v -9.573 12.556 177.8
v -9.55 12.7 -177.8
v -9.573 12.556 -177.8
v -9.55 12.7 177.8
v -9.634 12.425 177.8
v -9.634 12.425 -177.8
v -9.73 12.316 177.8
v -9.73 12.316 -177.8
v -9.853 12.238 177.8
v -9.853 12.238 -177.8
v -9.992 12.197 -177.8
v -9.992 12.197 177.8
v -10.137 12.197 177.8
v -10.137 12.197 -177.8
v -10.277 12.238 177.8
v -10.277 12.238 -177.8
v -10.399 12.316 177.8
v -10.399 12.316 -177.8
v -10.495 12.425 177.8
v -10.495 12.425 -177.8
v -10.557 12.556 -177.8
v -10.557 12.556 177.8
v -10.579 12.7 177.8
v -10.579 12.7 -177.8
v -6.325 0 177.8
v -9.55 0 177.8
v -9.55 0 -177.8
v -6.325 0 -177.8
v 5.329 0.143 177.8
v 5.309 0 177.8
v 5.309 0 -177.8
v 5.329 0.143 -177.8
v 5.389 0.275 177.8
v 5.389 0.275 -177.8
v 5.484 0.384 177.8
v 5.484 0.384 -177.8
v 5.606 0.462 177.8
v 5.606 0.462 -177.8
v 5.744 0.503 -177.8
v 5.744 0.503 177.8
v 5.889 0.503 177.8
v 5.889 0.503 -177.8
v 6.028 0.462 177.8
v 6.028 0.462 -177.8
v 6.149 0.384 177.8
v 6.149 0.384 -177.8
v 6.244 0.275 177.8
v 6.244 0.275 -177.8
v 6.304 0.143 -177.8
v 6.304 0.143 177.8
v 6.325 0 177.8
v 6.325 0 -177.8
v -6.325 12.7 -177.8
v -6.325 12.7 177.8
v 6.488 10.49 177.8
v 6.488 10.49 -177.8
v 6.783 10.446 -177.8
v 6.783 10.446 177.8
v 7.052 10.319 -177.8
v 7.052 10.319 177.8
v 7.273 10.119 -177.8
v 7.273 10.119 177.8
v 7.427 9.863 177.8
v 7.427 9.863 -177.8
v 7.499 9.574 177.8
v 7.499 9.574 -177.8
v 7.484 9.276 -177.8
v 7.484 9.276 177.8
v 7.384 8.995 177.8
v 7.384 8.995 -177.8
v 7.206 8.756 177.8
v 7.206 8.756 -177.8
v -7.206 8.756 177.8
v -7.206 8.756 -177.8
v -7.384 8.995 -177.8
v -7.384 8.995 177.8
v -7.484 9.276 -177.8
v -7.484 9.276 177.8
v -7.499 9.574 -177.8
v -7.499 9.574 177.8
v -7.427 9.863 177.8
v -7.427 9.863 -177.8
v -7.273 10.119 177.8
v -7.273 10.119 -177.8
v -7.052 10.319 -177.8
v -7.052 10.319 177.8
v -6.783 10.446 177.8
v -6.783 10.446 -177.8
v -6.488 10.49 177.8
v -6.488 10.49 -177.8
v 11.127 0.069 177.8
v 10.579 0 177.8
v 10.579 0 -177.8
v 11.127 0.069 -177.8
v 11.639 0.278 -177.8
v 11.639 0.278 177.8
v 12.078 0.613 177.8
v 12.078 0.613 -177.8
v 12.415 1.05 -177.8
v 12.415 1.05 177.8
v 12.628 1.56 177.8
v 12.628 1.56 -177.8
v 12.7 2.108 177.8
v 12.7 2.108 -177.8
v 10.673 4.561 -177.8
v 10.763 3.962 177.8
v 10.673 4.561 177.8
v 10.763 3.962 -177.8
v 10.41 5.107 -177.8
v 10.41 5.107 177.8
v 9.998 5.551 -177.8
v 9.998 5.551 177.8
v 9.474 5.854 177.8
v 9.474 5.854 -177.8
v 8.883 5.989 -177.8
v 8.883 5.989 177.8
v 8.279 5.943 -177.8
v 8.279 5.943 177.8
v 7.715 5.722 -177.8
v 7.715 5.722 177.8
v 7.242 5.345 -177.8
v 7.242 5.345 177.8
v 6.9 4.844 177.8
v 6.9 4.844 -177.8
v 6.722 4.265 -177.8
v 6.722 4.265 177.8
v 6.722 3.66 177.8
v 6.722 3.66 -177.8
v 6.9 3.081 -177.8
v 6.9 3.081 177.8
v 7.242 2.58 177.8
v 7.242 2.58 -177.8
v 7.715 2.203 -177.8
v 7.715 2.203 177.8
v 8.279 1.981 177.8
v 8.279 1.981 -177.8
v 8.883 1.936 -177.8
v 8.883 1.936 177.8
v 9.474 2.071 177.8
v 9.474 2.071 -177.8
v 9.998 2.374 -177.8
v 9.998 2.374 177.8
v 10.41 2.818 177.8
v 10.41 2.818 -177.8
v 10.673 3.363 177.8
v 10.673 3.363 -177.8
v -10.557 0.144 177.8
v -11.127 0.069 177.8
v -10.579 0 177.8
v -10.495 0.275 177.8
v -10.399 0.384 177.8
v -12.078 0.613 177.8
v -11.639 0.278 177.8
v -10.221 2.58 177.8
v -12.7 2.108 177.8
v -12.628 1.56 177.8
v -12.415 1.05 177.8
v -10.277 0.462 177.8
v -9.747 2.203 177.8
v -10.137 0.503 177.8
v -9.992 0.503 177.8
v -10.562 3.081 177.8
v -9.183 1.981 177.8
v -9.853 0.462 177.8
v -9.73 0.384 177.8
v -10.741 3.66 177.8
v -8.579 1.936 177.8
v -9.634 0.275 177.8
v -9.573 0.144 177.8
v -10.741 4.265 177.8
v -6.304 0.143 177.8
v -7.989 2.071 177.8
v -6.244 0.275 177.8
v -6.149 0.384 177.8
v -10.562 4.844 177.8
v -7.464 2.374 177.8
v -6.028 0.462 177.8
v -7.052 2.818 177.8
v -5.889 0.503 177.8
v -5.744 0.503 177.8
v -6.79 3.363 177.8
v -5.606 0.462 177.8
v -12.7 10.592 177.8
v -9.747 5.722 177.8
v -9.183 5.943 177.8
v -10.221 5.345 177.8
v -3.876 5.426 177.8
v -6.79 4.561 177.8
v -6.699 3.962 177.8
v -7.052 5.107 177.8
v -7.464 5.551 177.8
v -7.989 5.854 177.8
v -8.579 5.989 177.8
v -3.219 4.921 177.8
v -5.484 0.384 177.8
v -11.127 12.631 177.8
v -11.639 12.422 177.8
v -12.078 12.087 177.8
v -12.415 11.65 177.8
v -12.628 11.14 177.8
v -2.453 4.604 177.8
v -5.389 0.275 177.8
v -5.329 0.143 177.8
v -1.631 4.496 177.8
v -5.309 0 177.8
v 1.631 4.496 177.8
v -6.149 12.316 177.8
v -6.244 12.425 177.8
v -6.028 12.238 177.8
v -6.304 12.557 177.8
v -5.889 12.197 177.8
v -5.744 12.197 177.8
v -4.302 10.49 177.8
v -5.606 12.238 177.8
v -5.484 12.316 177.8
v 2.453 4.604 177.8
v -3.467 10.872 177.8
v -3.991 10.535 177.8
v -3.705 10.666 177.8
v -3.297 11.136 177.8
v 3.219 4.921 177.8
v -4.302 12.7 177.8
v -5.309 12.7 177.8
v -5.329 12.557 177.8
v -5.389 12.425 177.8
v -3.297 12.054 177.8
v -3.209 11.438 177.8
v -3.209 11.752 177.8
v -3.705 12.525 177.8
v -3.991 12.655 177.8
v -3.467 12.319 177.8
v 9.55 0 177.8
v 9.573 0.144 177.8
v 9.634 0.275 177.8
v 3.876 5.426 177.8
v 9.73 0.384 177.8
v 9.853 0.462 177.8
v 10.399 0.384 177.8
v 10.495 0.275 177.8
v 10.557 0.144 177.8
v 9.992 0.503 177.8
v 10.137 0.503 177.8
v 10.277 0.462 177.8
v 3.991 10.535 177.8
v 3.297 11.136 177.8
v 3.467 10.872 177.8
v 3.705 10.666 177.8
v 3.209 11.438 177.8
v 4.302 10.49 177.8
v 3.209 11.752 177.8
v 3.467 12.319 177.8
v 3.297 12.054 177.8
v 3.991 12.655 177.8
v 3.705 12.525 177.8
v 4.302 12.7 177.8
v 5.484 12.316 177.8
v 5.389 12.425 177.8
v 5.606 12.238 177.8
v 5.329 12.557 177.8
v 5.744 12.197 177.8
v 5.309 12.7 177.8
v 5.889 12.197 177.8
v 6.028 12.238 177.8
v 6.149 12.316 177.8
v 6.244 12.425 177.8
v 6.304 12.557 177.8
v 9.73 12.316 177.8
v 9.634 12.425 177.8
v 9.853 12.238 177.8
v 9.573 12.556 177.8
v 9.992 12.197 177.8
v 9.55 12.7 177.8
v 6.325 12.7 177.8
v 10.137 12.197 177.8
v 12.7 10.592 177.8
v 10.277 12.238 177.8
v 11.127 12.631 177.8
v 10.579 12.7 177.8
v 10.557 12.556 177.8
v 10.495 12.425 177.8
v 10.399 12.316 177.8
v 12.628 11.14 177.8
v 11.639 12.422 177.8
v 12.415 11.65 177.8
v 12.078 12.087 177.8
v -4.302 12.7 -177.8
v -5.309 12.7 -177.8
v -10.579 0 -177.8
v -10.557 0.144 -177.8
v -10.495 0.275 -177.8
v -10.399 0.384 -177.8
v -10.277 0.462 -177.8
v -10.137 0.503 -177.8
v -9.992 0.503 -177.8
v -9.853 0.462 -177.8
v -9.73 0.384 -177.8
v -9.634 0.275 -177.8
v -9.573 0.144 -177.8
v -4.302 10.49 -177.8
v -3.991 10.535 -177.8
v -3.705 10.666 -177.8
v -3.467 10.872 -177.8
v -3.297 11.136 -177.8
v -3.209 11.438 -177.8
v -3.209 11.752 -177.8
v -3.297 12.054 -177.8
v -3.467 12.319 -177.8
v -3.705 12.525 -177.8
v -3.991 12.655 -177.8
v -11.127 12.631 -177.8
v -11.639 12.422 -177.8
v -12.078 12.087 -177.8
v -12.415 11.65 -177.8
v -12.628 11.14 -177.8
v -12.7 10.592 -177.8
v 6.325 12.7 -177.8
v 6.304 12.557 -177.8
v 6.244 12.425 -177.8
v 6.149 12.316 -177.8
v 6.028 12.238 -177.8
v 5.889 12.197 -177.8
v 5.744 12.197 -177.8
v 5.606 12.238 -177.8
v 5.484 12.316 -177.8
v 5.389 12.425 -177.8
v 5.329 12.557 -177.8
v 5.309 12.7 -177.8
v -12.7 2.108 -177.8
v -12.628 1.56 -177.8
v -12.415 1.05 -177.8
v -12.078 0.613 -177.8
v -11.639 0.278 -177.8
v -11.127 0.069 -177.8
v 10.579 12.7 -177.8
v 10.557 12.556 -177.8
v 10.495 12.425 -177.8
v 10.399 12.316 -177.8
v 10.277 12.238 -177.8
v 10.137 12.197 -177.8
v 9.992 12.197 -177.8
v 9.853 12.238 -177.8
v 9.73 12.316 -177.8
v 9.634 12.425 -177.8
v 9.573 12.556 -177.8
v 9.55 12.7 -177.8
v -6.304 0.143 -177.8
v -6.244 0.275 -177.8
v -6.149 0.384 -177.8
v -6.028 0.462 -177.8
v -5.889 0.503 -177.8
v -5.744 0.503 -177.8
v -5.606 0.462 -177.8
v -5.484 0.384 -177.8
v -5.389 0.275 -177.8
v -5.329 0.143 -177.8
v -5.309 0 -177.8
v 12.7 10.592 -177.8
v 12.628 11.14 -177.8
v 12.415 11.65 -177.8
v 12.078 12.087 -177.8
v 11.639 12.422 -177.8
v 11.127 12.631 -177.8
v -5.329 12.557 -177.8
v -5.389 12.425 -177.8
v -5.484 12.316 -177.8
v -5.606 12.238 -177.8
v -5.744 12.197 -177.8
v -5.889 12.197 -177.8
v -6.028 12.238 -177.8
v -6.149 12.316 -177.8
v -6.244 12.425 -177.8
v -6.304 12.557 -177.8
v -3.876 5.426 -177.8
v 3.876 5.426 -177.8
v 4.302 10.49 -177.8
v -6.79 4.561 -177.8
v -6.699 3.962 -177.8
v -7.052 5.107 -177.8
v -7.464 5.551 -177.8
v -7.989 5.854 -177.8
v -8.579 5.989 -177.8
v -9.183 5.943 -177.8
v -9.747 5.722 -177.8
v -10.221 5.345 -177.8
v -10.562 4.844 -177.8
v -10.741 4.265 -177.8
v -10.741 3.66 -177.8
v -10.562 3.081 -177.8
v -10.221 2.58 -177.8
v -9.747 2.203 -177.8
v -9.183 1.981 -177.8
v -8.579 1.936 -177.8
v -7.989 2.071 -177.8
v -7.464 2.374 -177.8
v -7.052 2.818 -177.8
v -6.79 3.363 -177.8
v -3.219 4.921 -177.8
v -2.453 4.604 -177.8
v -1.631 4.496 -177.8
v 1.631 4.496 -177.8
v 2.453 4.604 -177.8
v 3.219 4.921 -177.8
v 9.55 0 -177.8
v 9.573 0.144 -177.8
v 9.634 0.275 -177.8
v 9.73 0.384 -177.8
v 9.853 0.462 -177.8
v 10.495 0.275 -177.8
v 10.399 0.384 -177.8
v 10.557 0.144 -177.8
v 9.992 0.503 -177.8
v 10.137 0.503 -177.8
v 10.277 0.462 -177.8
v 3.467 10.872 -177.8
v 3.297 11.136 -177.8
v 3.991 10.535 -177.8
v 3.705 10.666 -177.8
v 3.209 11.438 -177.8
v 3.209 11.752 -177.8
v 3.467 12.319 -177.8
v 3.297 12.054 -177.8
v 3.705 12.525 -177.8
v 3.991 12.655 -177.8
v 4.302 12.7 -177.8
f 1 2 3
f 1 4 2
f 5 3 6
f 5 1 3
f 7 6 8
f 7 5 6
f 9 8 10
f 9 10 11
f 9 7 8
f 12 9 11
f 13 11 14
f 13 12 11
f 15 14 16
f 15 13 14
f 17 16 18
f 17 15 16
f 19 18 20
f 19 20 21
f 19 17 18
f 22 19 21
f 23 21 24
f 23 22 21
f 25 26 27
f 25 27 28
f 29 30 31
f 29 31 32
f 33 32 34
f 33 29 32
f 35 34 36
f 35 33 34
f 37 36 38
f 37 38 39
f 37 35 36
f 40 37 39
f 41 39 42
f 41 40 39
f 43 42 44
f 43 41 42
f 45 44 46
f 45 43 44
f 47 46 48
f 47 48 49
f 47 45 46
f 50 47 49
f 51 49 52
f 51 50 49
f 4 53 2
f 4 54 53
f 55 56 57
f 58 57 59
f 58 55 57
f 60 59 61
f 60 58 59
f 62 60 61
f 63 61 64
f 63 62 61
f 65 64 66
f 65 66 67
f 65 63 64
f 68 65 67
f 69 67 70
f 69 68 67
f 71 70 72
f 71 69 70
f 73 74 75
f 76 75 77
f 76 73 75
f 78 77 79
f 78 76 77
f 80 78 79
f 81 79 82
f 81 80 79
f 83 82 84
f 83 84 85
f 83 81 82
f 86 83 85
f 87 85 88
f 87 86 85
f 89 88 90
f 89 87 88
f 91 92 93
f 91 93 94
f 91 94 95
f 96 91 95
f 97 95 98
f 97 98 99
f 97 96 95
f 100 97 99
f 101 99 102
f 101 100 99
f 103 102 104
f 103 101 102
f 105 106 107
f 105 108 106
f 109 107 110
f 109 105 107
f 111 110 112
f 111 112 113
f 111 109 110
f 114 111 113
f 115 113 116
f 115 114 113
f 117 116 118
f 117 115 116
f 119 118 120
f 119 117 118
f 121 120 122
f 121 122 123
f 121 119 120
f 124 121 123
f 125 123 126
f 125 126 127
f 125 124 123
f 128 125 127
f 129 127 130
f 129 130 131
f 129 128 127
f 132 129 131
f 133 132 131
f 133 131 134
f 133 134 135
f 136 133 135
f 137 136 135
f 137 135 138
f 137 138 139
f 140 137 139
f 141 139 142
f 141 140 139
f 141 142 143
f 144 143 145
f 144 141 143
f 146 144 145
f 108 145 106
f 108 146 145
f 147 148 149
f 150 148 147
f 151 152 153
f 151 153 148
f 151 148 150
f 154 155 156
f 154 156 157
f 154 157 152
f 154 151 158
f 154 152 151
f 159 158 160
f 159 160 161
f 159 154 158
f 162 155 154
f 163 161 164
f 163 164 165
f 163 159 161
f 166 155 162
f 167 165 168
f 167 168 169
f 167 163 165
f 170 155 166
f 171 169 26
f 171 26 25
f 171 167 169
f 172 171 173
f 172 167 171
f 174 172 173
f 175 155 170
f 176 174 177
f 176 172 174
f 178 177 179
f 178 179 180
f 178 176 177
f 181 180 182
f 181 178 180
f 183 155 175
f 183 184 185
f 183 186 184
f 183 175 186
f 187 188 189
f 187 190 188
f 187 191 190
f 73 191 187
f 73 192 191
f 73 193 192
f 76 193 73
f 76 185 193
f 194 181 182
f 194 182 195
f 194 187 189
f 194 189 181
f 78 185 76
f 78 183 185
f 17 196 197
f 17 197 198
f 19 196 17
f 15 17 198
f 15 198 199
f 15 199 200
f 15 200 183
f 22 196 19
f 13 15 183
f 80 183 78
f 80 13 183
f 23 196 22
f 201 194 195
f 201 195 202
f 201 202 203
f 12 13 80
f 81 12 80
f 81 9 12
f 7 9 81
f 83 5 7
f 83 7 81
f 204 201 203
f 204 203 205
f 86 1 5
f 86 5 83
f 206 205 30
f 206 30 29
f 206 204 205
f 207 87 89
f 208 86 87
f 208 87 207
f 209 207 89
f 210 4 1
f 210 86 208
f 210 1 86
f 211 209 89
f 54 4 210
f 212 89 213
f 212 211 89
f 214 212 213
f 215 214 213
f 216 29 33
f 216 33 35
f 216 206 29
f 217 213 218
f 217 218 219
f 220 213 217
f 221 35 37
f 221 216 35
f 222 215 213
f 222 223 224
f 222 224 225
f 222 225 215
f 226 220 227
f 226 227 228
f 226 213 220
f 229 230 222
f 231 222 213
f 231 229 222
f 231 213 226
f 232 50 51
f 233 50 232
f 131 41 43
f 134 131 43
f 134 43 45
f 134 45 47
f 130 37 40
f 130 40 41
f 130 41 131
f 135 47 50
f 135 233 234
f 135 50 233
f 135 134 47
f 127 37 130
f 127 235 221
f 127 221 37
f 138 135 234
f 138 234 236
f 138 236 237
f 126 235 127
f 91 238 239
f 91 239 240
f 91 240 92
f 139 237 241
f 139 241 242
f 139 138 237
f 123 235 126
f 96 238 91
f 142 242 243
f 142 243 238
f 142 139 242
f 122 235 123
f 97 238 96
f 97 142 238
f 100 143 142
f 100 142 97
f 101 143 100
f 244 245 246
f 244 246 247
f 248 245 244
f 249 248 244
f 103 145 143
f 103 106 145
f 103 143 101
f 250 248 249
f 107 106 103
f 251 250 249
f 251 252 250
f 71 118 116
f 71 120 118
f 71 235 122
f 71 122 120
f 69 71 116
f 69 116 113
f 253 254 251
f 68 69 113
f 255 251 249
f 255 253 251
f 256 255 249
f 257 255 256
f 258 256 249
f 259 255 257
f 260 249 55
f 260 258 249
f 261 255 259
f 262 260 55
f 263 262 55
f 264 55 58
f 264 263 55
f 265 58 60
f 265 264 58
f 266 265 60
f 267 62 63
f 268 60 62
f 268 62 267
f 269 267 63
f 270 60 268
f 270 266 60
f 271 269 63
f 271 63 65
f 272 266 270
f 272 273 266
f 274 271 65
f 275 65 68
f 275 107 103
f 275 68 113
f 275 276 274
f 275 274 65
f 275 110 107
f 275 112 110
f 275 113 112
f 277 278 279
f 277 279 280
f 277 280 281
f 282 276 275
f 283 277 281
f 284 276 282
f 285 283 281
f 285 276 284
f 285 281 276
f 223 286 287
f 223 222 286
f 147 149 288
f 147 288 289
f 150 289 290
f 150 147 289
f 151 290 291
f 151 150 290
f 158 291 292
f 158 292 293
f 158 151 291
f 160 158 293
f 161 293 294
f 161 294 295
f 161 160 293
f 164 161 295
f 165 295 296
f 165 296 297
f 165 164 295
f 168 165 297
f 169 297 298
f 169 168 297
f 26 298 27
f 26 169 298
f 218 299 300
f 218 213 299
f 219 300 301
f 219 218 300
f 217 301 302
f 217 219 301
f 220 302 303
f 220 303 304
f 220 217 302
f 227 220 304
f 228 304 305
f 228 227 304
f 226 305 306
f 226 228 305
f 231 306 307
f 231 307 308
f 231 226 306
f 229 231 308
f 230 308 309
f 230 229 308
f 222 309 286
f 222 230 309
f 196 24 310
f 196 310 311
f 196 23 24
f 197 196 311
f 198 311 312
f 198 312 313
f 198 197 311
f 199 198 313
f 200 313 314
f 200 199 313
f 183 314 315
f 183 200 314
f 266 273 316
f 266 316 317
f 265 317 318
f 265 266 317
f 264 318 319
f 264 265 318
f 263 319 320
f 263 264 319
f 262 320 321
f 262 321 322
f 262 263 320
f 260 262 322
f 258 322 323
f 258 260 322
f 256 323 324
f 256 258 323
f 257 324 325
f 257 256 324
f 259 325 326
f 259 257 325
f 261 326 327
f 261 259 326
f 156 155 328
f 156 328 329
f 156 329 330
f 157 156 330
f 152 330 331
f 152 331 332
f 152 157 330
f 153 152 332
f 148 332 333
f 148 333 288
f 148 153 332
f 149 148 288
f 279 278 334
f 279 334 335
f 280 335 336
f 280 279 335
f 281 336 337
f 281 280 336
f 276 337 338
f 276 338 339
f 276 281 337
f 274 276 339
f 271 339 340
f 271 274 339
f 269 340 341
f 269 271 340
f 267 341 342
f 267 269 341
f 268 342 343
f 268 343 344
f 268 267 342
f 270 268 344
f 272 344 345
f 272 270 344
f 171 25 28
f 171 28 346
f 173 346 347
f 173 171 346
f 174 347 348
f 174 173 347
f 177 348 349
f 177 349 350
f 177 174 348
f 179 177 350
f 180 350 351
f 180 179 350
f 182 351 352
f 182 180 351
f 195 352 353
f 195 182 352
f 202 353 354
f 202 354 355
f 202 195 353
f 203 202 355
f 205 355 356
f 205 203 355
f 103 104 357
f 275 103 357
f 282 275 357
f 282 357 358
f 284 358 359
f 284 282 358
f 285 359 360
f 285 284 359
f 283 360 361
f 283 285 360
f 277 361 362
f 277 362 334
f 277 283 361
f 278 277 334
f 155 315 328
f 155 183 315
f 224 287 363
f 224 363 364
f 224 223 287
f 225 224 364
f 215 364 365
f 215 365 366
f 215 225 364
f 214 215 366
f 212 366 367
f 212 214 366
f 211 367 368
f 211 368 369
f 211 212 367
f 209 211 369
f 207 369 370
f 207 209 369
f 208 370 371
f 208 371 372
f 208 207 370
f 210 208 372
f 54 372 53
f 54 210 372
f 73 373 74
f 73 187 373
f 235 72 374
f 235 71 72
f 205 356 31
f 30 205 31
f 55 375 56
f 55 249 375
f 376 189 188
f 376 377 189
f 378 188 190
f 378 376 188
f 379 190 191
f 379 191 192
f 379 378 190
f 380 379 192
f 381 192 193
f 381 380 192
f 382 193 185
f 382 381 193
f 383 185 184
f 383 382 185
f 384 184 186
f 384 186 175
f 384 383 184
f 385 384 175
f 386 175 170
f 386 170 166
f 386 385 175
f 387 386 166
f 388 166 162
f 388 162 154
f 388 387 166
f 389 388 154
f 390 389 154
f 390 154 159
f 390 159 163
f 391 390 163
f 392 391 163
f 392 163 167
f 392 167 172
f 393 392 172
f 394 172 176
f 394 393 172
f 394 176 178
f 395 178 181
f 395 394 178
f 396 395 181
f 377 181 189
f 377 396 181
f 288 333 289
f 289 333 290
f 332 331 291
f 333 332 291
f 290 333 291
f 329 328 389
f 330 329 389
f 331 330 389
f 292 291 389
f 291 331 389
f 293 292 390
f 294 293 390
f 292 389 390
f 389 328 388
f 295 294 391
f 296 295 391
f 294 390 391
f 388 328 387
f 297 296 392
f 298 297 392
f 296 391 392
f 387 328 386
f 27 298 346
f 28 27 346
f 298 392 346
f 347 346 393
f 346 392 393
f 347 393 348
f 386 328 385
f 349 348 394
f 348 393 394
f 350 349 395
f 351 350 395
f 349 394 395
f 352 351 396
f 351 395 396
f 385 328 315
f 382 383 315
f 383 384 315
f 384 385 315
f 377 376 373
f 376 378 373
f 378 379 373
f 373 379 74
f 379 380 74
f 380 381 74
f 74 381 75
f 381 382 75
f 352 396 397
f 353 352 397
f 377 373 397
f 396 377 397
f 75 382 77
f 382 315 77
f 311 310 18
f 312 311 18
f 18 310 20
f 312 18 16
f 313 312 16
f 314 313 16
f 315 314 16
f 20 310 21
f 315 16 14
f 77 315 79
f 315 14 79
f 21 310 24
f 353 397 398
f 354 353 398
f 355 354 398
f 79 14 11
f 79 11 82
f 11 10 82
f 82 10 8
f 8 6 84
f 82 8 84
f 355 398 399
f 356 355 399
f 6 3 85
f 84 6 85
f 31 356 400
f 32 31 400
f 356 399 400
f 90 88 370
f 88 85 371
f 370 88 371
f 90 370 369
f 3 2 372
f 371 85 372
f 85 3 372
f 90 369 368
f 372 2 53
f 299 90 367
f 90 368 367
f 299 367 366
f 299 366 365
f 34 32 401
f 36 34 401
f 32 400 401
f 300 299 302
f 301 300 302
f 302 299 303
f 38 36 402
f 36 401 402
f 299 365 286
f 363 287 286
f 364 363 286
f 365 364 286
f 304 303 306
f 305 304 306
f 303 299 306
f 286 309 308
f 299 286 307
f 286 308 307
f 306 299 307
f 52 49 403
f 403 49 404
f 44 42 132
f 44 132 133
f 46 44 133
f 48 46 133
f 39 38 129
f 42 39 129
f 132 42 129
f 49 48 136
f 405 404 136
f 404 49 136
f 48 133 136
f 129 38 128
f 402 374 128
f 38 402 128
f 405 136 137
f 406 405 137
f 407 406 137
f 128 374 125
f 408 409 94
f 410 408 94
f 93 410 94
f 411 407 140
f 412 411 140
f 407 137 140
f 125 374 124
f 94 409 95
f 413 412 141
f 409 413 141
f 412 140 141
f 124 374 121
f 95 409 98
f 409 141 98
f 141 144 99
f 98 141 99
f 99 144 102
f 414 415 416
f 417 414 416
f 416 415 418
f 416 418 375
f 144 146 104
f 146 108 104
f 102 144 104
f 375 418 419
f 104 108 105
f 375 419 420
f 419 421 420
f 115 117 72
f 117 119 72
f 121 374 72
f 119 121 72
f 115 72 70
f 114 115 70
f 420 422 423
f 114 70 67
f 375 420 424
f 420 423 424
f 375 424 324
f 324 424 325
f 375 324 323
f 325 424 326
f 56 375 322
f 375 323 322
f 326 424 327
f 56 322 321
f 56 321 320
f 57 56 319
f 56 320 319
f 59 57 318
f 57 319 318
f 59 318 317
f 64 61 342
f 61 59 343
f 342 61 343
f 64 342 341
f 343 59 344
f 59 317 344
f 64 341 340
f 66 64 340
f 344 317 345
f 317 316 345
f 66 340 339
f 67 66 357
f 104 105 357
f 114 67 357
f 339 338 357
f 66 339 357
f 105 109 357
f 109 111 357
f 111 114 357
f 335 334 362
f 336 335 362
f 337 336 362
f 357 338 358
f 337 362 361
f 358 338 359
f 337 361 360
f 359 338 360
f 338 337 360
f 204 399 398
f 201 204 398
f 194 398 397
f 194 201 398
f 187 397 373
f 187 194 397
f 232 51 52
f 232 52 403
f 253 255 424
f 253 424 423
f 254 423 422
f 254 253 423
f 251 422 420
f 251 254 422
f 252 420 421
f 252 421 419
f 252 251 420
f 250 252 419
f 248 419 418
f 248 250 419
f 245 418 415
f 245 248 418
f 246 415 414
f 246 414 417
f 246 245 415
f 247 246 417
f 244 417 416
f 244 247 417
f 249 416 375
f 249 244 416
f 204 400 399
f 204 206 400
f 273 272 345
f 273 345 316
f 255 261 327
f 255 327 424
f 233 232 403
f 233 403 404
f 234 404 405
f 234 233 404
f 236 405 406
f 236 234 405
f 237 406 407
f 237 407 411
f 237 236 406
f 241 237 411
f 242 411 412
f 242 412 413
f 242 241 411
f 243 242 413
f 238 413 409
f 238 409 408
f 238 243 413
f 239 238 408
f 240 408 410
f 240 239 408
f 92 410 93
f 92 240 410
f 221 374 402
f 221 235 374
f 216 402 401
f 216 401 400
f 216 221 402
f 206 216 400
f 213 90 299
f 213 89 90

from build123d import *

# Parameters (mm, degrees)
SKETCH1_R           = 2.032
BOSS_EXTRUDE1_DEPTH = 177.8


with BuildPart() as part:
    # Sketch1 → Boss-Extrude1 (new, symmetric)
    with BuildSketch(Plane.XY):
        with BuildLine():
            Line((-12.7, 10.591838253), (-12.7, 2.108161747))
            ThreePointArc((-12.7, 2.108161747), (-12.078025605, 0.612955845), (-10.5791, 0))
            ThreePointArc((-10.5791, 0), (-10.06475, 0.508039196), (-9.5504, 0))
            Line((-9.5504, 0), (-6.3246, 0))
            ThreePointArc((-6.3246, 0), (-5.8166, 0.508), (-5.3086, 0))
            Line((-5.3086, 0), (5.3086, 0))
            ThreePointArc((5.3086, 0), (5.8166, 0.508), (6.3246, 0))
            Line((6.3246, 0), (9.5504, 0))
            ThreePointArc((9.5504, 0), (10.06475, 0.508039196), (10.5791, 0))
            ThreePointArc((10.5791, 0), (12.078025605, 0.612955845), (12.7, 2.108161747))
            Line((12.7, 2.108161747), (12.7, 10.591838253))
            ThreePointArc((12.7, 10.591838253), (12.078025605, 12.087044155), (10.5791, 12.7))
            ThreePointArc((10.5791, 12.7), (10.06475, 12.191960804), (9.5504, 12.7))
            Line((9.5504, 12.7), (6.3246, 12.7))
            ThreePointArc((6.3246, 12.7), (5.816599999, 12.191999983), (5.3086, 12.700000002))
            Line((5.3086, 12.700000002), (4.302307889, 12.700000002))
            ThreePointArc((4.302307889, 12.700000002), (3.197407889, 11.595100002), (4.302307889, 10.490200002))
            Line((4.302307889, 10.490200002), (6.487959021, 10.490200002))
            ThreePointArc((6.487959021, 10.490200002), (7.426620626, 9.863006369), (7.20637951, 8.755779512))
            Line((7.20637951, 8.755779512), (3.87633597, 5.425735971))
            ThreePointArc((3.87633597, 5.425735971), (2.846291837, 4.737482486), (1.631271939, 4.495800002))
            Line((1.631271939, 4.495800002), (-1.631271939, 4.495800002))
            ThreePointArc((-1.631271939, 4.495800002), (-2.846291837, 4.737482486), (-3.87633597, 5.425735971))
            Line((-3.87633597, 5.425735971), (-7.20637951, 8.755779512))
            ThreePointArc((-7.20637951, 8.755779512), (-7.426620626, 9.863006369), (-6.487959021, 10.490200002))
            Line((-6.487959021, 10.490200002), (-4.302307889, 10.490200002))
            ThreePointArc((-4.302307889, 10.490200002), (-3.197407889, 11.595100002), (-4.302307889, 12.700000002))
            Line((-4.302307889, 12.700000002), (-5.3086, 12.700000002))
            ThreePointArc((-5.3086, 12.700000002), (-5.816599999, 12.191999985), (-6.3246, 12.7))
            Line((-6.3246, 12.7), (-9.5504, 12.7))
            ThreePointArc((-9.5504, 12.7), (-10.06475, 12.191960804), (-10.5791, 12.7))
            ThreePointArc((-10.5791, 12.7), (-12.078025605, 12.087044155), (-12.7, 10.591838253))
        make_face()
        with Locations((-8.73125, 3.9624)):
            Circle(SKETCH1_R, mode=Mode.SUBTRACT)
        with Locations((8.73125, 3.9624)):
            Circle(SKETCH1_R, mode=Mode.SUBTRACT)
    extrude(amount=BOSS_EXTRUDE1_DEPTH, both=True)


solid = part.part
